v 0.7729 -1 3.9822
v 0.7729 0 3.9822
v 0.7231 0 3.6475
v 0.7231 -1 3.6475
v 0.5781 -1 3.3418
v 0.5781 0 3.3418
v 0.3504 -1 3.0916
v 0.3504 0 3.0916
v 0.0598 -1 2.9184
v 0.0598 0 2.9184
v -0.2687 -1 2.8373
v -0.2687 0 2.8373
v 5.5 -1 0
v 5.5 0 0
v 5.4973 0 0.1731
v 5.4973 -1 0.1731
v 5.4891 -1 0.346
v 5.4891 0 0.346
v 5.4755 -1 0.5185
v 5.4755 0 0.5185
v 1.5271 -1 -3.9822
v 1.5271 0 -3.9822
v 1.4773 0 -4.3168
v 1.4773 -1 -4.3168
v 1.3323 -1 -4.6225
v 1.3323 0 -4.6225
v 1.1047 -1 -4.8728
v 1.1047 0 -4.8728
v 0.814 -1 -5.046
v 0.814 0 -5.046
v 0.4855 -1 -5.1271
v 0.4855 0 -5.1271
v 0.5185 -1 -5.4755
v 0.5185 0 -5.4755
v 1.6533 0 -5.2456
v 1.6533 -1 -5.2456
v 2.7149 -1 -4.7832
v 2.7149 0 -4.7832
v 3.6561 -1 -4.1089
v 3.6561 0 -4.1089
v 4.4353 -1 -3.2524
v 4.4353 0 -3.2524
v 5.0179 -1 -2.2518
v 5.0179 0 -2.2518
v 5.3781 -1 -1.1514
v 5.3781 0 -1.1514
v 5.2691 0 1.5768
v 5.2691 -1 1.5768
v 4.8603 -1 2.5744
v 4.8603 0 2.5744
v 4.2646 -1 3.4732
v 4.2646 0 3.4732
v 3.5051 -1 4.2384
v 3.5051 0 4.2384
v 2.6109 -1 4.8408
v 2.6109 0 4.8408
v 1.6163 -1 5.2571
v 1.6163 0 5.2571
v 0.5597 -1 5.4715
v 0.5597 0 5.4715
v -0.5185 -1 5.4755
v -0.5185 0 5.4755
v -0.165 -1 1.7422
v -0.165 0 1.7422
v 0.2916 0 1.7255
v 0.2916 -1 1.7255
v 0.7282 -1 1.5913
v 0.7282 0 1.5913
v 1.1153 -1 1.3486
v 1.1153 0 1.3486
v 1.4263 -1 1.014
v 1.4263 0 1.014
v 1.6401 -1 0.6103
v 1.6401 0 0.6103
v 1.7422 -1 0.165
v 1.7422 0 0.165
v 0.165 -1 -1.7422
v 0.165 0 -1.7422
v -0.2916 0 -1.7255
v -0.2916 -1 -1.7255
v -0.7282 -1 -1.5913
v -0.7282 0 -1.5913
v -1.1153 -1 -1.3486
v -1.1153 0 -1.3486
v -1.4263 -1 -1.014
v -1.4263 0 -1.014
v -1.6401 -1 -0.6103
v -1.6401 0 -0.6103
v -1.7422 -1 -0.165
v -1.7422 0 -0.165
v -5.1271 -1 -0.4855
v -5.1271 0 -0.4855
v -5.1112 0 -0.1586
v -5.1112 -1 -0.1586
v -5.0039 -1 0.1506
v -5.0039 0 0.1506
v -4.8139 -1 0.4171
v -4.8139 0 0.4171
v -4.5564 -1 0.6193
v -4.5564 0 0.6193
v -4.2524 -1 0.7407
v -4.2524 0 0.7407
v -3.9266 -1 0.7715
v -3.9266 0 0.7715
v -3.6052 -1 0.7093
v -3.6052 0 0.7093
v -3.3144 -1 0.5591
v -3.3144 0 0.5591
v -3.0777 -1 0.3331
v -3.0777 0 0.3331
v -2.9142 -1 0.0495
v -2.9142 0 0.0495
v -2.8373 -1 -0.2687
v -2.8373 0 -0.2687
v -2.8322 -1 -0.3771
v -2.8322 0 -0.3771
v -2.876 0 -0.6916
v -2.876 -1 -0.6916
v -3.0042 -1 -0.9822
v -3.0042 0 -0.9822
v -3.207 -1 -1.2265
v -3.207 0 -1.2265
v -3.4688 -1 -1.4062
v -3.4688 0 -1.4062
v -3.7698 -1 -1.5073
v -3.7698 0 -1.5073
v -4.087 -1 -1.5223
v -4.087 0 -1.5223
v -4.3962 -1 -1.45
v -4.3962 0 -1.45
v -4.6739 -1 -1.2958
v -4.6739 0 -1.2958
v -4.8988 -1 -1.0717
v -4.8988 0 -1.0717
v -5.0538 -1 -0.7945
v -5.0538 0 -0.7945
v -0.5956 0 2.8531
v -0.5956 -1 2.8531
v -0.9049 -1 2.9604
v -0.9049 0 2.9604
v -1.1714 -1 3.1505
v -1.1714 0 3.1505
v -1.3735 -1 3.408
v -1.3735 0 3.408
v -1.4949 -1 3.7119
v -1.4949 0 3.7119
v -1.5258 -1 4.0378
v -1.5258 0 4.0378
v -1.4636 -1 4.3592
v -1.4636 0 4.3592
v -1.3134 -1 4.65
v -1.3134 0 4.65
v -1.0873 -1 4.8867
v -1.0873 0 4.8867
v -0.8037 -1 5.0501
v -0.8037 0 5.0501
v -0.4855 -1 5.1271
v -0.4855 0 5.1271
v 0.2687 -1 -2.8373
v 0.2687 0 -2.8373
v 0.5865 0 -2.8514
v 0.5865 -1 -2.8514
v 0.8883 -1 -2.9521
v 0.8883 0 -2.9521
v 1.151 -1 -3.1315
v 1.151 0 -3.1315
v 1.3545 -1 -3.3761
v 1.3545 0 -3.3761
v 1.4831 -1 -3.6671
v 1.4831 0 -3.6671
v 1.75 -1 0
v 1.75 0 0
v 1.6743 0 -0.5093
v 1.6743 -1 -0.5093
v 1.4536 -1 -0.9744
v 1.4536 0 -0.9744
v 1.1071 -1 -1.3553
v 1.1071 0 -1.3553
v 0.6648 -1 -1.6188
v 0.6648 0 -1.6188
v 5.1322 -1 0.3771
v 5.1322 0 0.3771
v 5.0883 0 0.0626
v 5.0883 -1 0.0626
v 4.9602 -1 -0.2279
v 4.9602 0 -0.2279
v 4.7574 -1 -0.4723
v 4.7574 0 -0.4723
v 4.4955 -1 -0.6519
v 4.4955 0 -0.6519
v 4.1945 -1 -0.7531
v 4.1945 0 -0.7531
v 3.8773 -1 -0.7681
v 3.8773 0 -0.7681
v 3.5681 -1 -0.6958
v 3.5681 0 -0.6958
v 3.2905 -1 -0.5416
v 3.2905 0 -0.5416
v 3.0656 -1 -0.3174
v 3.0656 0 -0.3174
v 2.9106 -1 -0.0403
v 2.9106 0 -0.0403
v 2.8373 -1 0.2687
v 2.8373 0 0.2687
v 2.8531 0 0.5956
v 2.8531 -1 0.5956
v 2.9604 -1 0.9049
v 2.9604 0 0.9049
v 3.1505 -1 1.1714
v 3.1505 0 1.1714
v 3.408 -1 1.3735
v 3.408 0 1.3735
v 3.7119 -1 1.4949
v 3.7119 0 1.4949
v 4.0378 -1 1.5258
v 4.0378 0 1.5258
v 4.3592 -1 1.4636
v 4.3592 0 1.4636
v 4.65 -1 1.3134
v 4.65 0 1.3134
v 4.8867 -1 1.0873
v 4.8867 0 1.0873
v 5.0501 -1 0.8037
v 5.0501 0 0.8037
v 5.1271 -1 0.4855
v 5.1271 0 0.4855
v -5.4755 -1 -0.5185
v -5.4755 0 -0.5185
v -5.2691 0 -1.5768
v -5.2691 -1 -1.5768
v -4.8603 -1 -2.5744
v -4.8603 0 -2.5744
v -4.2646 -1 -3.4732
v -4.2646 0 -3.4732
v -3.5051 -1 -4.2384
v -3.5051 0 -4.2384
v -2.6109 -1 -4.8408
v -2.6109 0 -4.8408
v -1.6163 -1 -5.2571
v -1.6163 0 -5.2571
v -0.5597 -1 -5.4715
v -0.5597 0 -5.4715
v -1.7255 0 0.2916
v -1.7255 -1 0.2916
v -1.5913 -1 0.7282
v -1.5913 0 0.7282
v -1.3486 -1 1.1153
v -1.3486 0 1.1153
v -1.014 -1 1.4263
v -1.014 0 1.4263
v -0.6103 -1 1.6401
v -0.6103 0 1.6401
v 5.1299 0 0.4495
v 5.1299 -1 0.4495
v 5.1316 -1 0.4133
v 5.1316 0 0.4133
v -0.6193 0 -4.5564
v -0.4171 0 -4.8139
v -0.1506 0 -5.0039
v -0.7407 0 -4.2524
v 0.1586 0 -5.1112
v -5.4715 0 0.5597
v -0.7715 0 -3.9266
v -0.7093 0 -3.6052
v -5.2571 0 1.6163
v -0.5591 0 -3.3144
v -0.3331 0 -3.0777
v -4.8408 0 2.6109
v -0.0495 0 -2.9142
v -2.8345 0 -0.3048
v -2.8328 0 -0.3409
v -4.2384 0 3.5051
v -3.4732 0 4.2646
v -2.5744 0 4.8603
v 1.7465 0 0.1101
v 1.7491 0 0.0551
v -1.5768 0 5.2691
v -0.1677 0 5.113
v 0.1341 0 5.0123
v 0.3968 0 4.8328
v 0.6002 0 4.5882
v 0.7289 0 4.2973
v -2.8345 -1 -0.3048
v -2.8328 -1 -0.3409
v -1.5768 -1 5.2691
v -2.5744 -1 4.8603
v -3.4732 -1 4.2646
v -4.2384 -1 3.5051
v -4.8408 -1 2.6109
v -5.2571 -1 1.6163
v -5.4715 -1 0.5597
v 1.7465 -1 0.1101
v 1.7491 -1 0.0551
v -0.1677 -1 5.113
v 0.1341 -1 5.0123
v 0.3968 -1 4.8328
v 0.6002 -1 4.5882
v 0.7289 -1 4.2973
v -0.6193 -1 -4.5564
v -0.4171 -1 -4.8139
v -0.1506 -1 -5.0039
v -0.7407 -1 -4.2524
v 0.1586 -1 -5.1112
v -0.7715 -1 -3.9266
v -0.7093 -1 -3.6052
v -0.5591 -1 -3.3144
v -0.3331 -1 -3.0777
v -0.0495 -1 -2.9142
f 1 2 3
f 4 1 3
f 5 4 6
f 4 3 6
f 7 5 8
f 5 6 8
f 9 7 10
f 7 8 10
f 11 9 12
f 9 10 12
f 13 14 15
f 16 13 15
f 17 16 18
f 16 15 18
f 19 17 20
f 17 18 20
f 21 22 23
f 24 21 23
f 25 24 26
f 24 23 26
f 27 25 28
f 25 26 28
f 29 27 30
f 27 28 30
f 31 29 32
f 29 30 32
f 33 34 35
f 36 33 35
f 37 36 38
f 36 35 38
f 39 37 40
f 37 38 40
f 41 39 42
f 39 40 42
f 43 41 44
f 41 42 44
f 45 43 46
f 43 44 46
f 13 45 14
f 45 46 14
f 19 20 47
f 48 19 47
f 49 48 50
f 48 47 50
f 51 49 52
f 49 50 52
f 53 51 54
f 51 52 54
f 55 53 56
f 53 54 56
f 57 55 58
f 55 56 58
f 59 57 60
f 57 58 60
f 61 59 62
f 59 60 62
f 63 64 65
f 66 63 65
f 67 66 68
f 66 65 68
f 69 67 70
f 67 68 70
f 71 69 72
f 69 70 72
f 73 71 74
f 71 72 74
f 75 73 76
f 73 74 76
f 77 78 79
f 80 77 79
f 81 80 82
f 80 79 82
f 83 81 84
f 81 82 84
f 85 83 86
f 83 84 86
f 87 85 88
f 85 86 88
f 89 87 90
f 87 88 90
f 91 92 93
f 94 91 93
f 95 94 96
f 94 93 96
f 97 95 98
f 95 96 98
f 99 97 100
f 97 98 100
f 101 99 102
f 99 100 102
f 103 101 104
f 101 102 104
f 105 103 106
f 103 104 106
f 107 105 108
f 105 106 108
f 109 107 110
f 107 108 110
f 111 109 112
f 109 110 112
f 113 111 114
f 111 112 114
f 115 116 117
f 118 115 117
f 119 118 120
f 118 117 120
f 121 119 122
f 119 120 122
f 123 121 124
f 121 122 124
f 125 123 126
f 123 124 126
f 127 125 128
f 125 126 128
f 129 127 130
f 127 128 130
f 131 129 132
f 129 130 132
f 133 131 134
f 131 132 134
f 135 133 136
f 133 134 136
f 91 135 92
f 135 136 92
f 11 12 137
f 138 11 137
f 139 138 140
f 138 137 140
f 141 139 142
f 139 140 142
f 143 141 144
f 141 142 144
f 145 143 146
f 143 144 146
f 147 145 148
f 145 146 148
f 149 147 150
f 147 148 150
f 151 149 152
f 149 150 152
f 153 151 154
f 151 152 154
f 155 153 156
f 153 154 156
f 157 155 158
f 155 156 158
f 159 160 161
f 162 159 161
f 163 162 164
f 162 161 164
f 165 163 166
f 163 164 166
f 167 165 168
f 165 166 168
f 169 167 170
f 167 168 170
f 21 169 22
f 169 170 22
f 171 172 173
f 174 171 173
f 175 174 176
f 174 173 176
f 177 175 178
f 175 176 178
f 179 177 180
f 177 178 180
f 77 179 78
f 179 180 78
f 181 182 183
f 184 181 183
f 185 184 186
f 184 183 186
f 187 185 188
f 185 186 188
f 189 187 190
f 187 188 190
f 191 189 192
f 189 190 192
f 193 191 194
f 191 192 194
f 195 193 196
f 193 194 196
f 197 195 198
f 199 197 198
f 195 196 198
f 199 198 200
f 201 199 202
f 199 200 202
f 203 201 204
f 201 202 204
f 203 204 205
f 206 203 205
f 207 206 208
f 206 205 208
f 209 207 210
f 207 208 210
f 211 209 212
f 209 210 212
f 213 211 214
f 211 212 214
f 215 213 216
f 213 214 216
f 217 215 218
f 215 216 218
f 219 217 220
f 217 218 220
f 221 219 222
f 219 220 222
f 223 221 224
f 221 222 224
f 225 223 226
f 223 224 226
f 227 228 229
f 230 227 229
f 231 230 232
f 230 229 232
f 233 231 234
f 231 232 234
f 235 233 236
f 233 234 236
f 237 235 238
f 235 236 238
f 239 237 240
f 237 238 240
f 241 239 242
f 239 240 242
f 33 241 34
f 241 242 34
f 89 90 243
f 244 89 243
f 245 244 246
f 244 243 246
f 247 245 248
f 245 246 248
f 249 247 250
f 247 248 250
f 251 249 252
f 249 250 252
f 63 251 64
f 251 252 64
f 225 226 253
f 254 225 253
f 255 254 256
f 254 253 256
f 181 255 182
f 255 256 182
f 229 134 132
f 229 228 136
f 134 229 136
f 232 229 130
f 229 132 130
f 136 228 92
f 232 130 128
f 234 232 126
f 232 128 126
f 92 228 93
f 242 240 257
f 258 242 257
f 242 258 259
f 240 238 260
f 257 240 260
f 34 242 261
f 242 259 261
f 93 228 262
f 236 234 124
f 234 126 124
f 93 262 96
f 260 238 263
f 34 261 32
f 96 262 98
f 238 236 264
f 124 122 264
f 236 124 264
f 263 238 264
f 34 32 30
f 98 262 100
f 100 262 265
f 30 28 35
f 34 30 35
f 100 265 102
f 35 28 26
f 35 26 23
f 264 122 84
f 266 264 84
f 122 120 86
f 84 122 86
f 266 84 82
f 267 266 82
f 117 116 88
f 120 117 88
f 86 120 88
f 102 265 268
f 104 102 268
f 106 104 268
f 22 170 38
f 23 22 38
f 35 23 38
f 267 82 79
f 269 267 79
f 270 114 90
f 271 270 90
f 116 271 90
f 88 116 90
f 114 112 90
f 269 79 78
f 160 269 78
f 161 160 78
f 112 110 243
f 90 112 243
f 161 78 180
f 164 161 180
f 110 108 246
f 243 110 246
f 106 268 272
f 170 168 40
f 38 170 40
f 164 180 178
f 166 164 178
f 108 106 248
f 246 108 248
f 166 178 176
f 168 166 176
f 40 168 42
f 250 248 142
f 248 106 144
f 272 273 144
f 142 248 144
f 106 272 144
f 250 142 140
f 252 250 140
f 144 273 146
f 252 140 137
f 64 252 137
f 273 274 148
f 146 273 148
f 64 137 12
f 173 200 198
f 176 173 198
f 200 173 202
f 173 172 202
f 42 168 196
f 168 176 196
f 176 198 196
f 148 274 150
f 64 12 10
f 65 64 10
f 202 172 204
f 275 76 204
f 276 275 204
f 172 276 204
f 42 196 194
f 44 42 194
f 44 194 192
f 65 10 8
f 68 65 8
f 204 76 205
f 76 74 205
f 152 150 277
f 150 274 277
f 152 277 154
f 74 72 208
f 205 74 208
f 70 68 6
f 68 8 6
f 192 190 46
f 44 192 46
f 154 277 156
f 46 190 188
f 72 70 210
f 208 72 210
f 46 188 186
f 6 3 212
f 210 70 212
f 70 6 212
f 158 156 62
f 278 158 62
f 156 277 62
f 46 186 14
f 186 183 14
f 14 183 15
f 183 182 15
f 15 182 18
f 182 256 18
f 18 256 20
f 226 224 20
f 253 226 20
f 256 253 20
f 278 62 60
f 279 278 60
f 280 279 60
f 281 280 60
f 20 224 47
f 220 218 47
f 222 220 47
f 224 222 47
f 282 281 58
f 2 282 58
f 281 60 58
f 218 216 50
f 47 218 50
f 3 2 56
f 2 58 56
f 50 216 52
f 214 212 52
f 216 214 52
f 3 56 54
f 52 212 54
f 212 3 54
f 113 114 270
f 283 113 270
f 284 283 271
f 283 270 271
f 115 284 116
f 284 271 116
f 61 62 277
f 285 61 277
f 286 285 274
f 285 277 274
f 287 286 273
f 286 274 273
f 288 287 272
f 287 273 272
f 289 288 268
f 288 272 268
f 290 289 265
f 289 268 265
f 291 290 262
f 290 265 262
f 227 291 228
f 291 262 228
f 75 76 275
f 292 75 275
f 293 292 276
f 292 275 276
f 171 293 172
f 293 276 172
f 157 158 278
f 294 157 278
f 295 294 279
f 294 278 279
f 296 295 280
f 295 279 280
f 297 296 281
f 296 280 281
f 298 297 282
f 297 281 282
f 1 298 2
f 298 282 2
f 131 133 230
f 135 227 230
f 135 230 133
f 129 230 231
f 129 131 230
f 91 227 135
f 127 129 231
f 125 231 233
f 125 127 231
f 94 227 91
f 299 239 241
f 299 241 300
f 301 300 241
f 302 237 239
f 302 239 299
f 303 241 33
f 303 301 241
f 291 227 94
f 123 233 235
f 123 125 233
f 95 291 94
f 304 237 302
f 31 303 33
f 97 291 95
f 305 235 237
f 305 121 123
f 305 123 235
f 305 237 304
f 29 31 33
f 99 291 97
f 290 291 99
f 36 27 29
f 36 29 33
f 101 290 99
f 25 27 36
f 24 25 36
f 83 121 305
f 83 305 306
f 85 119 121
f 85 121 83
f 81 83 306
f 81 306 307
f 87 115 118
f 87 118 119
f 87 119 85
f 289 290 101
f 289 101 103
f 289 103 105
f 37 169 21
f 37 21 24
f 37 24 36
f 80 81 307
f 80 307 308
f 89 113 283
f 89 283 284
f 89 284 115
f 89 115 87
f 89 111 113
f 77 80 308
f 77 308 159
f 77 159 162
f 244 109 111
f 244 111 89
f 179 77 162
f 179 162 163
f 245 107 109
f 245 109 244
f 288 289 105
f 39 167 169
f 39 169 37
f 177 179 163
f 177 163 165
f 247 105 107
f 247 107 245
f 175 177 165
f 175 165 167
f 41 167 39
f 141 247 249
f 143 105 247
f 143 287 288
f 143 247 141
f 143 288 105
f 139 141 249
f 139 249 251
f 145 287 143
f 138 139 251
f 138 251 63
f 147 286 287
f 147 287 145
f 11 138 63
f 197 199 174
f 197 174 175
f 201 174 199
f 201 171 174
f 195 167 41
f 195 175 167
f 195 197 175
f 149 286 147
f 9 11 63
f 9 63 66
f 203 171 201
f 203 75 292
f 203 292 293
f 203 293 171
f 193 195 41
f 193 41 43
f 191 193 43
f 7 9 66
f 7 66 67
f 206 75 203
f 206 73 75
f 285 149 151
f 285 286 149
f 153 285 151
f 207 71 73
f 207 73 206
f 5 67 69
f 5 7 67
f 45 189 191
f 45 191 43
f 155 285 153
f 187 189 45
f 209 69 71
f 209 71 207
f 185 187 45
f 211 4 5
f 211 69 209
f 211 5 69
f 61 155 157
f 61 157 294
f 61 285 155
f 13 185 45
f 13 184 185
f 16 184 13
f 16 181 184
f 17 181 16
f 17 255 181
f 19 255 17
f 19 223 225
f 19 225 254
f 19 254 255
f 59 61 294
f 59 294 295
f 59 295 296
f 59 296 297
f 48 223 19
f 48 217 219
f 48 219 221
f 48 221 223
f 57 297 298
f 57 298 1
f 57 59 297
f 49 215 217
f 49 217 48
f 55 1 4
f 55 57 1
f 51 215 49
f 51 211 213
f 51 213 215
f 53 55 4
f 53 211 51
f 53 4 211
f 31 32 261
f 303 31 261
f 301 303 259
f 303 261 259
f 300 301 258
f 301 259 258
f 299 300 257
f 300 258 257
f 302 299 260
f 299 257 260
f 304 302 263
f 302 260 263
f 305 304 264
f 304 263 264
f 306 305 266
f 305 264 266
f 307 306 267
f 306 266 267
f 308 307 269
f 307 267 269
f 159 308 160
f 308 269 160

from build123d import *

# Parameters (mm, degrees)
F1_DEPTH = 1


with BuildPart() as f1:
    # F0 (on Front) → F1 (new body)
    with BuildSketch(Plane.XZ):
        with BuildLine():
            ThreePointArc((-5.4755023983, -0.5185301207), (-3.5051087117, -4.2384210408), (0.5185301207, -5.4755023983))
            ThreePointArc((0.5185301207, -5.4755023983), (-1.1162060212, -4.123600864), (0.2356955176, -2.4888647257))
            ThreePointArc((0.2356955176, -2.4888647257), (-1.593231229, -1.9265550215), (-2.4888647264, -0.2356955103))
            ThreePointArc((-2.4888647264, -0.2356955103), (-2.4838547844, -0.3063252949), (-2.4821835624, -0.3771128151))
            ThreePointArc((-2.4821835624, -0.3771128151), (-3.9113960418, -1.875441593), (-5.4755023983, -0.5185301207))
        make_face()
        with BuildLine():
            ThreePointArc((-0.2356955143, 2.488864726), (-1.8704316512, 3.8407662592), (-0.5185301207, 5.4755023983))
            ThreePointArc((-0.5185301207, 5.4755023983), (-4.2384210408, 3.5051087117), (-5.4755023983, -0.5185301207))
            ThreePointArc((-5.4755023983, -0.5185301207), (-4.1236008676, 1.1162060209), (-2.4888647264, -0.2356955103))
            ThreePointArc((-2.4888647264, -0.2356955103), (-1.9265550204, 1.5932312303), (-0.2356955143, 2.488864726))
        make_face()
        with BuildLine():
            ThreePointArc((2.4888647264, 0.2356955103), (3.8407662572, 1.870431651), (5.4755023983, 0.5185301207))
            ThreePointArc((5.4755023983, 0.5185301207), (3.5051087117, 4.2384210408), (-0.5185301207, 5.4755023983))
            ThreePointArc((-0.5185301207, 5.4755023983), (0.6323112885, 5.0917163376), (1.1228871849, 3.9821835624))
            ThreePointArc((1.1228871849, 3.9821835624), (0.7324199585, 2.9727594571), (-0.2356955143, 2.488864726))
            ThreePointArc((-0.2356955143, 2.488864726), (1.5932312303, 1.9265550204), (2.4888647264, 0.2356955103))
        make_face()
        with BuildLine():
            ThreePointArc((0.5185301207, -5.4755023983), (4.0682868424, -3.7012217129), (5.5, 0))
            ThreePointArc((5.5, 0), (5.4938721859, 0.2595542422), (5.4755023983, 0.5185301207))
            ThreePointArc((5.4755023983, 0.5185301207), (5.4805123404, 0.4479003357), (5.4821835624, 0.3771128151))
            ThreePointArc((5.4821835624, 0.3771128151), (4.0529710825, -1.1212159629), (2.4888647264, 0.2356955103))
            ThreePointArc((2.4888647264, 0.2356955103), (2.4972146299, 0.1179792015), (2.5, 0))
            ThreePointArc((2.5, 0), (1.8492212948, -1.6823735028), (0.2356955176, -2.4888647257))
            ThreePointArc((0.2356955176, -2.4888647257), (1.3865369216, -2.87265079), (1.8771128151, -3.9821835624))
            ThreePointArc((1.8771128151, -3.9821835624), (1.4866455903, -4.9916076659), (0.5185301207, -5.4755023983))
        make_face()
        with BuildLine():
            Line((-5.1270613366, -0.4855327494), (-5.4755023983, -0.5185301207))
            ThreePointArc((-5.4755023983, -0.5185301207), (-3.9113960418, -1.875441593), (-2.4821835624, -0.3771128151))
            ThreePointArc((-2.4821835624, -0.3771128151), (-2.4838547844, -0.3063252949), (-2.4888647264, -0.2356955103))
            Line((-2.4888647265, -0.2356955094), (-2.8373057882, -0.2686928807))
            ThreePointArc((-2.8373057882, -0.2686928807), (-2.8334648326, -0.3228423826), (-2.8321835624, -0.3771128151))
            ThreePointArc((-2.8321835624, -0.3771128151), (-3.9279131299, -1.5258315448), (-5.1270613366, -0.4855327494))
        make_face()
        with BuildLine():
            ThreePointArc((-2.4888647264, -0.2356955103), (-4.1236008676, 1.1162060209), (-5.4755023983, -0.5185301207))
            Line((-5.4755023983, -0.5185301207), (-5.1270613366, -0.4855327494))
            ThreePointArc((-5.1270613366, -0.4855327494), (-4.0906034967, 0.7677649591), (-2.8373057882, -0.2686928807))
            Line((-2.8373057882, -0.2686928807), (-2.4888647265, -0.2356955094))
        make_face()
        with BuildLine():
            Line((-0.4855327494, 5.1270613366), (-0.5185301207, 5.4755023983))
            ThreePointArc((-0.5185301207, 5.4755023983), (-1.8704316512, 3.8407662592), (-0.2356955143, 2.488864726))
            Line((-0.2356955094, 2.4888647265), (-0.2686928807, 2.8373057882))
            ThreePointArc((-0.2686928807, 2.8373057882), (-1.5219905893, 3.8737636281), (-0.4855327494, 5.1270613366))
        make_face()
        with BuildLine():
            ThreePointArc((1.1228871849, 3.9821835624), (0.6323112885, 5.0917163376), (-0.5185301207, 5.4755023983))
            Line((-0.5185301207, 5.4755023983), (-0.4855327494, 5.1270613366))
            ThreePointArc((-0.4855327494, 5.1270613366), (0.3967789976, 4.8328253567), (0.7728871849, 3.9821835624))
            ThreePointArc((0.7728871849, 3.9821835624), (0.4735289793, 3.2082917497), (-0.2686928807, 2.8373057882))
            Line((-0.2686928807, 2.8373057882), (-0.2356955094, 2.4888647265))
            ThreePointArc((-0.2356955143, 2.488864726), (0.7324199585, 2.9727594571), (1.1228871849, 3.9821835624))
        make_face()
        with BuildLine():
            Line((0.4855327494, -5.1270613366), (0.5185301207, -5.4755023983))
            ThreePointArc((0.5185301207, -5.4755023983), (1.4866455903, -4.9916076659), (1.8771128151, -3.9821835624))
            ThreePointArc((1.8771128151, -3.9821835624), (1.3865369216, -2.87265079), (0.2356955176, -2.4888647257))
            Line((0.2356955094, -2.4888647265), (0.2686928807, -2.8373057882))
            ThreePointArc((0.2686928807, -2.8373057882), (1.1510046278, -3.1315417681), (1.5271128151, -3.9821835624))
            ThreePointArc((1.5271128151, -3.9821835624), (1.2277546094, -4.7560753751), (0.4855327494, -5.1270613366))
        make_face()
        with BuildLine():
            ThreePointArc((0.2356955176, -2.4888647257), (-1.1162060212, -4.123600864), (0.5185301207, -5.4755023983))
            Line((0.5185301207, -5.4755023983), (0.4855327494, -5.1270613366))
            ThreePointArc((0.4855327494, -5.1270613366), (-0.7677649591, -4.0906034967), (0.2686928807, -2.8373057882))
            Line((0.2686928807, -2.8373057882), (0.2356955094, -2.4888647265))
        make_face()
        with BuildLine():
            ThreePointArc((5.4821835624, 0.3771128151), (5.4805123404, 0.4479003357), (5.4755023983, 0.5185301207))
            Line((5.4755023983, 0.5185301207), (5.1270613366, 0.4855327494))
            ThreePointArc((5.1270613366, 0.4855327494), (5.1309022922, 0.4313832475), (5.1321835624, 0.3771128151))
            ThreePointArc((5.1321835624, 0.3771128151), (4.0364539949, -0.7716059147), (2.8373057882, 0.2686928807))
            Line((2.8373057882, 0.2686928807), (2.4888647265, 0.2356955094))
            ThreePointArc((2.4888647264, 0.2356955103), (4.0529710825, -1.1212159629), (5.4821835624, 0.3771128151))
        make_face()
        with BuildLine():
            Line((5.1270613366, 0.4855327494), (5.4755023983, 0.5185301207))
            ThreePointArc((5.4755023983, 0.5185301207), (3.8407662572, 1.870431651), (2.4888647264, 0.2356955103))
            Line((2.4888647265, 0.2356955094), (2.8373057882, 0.2686928807))
            ThreePointArc((2.8373057882, 0.2686928807), (3.8737636281, 1.5219905893), (5.1270613366, 0.4855327494))
        make_face()
        with BuildLine():
            Line((-0.1649868566, 1.7422053086), (-0.2356955094, 2.4888647265))
            ThreePointArc((-0.2356955143, 2.488864726), (-1.9265550204, 1.5932312303), (-2.4888647264, -0.2356955103))
            Line((-2.4888647265, -0.2356955094), (-1.7422053086, -0.1649868566))
            ThreePointArc((-1.7422053086, -0.1649868566), (-1.348588513, 1.1152618628), (-0.1649868566, 1.7422053086))
        make_face()
        with BuildLine():
            Line((1.7422053086, 0.1649868566), (2.4888647265, 0.2356955094))
            ThreePointArc((2.4888647264, 0.2356955103), (1.5932312303, 1.9265550204), (-0.2356955143, 2.488864726))
            Line((-0.2356955094, 2.4888647265), (-0.1649868566, 1.7422053086))
            ThreePointArc((-0.1649868566, 1.7422053086), (1.1152618628, 1.348588513), (1.7422053086, 0.1649868566))
        make_face()
        with BuildLine():
            ThreePointArc((-2.4888647264, -0.2356955103), (-1.593231229, -1.9265550215), (0.2356955176, -2.4888647257))
            Line((0.2356955094, -2.4888647265), (0.1649868566, -1.7422053086))
            ThreePointArc((0.1649868566, -1.7422053086), (-1.1152618628, -1.348588513), (-1.7422053086, -0.1649868566))
            Line((-1.7422053086, -0.1649868566), (-2.4888647265, -0.2356955094))
        make_face()
        with BuildLine():
            ThreePointArc((2.5, 0), (2.4972146299, 0.1179792015), (2.4888647264, 0.2356955103))
            Line((2.4888647265, 0.2356955094), (1.7422053086, 0.1649868566))
            ThreePointArc((1.7422053086, 0.1649868566), (1.748050241, 0.0825854407), (1.75, 0))
            ThreePointArc((1.75, 0), (1.2944549044, -1.1776614541), (0.1649868566, -1.7422053086))
            Line((0.1649868566, -1.7422053086), (0.2356955094, -2.4888647265))
            ThreePointArc((0.2356955176, -2.4888647257), (1.8492212948, -1.6823735028), (2.5, 0))
        make_face()
    extrude(amount=F1_DEPTH)


solid = f1.part
